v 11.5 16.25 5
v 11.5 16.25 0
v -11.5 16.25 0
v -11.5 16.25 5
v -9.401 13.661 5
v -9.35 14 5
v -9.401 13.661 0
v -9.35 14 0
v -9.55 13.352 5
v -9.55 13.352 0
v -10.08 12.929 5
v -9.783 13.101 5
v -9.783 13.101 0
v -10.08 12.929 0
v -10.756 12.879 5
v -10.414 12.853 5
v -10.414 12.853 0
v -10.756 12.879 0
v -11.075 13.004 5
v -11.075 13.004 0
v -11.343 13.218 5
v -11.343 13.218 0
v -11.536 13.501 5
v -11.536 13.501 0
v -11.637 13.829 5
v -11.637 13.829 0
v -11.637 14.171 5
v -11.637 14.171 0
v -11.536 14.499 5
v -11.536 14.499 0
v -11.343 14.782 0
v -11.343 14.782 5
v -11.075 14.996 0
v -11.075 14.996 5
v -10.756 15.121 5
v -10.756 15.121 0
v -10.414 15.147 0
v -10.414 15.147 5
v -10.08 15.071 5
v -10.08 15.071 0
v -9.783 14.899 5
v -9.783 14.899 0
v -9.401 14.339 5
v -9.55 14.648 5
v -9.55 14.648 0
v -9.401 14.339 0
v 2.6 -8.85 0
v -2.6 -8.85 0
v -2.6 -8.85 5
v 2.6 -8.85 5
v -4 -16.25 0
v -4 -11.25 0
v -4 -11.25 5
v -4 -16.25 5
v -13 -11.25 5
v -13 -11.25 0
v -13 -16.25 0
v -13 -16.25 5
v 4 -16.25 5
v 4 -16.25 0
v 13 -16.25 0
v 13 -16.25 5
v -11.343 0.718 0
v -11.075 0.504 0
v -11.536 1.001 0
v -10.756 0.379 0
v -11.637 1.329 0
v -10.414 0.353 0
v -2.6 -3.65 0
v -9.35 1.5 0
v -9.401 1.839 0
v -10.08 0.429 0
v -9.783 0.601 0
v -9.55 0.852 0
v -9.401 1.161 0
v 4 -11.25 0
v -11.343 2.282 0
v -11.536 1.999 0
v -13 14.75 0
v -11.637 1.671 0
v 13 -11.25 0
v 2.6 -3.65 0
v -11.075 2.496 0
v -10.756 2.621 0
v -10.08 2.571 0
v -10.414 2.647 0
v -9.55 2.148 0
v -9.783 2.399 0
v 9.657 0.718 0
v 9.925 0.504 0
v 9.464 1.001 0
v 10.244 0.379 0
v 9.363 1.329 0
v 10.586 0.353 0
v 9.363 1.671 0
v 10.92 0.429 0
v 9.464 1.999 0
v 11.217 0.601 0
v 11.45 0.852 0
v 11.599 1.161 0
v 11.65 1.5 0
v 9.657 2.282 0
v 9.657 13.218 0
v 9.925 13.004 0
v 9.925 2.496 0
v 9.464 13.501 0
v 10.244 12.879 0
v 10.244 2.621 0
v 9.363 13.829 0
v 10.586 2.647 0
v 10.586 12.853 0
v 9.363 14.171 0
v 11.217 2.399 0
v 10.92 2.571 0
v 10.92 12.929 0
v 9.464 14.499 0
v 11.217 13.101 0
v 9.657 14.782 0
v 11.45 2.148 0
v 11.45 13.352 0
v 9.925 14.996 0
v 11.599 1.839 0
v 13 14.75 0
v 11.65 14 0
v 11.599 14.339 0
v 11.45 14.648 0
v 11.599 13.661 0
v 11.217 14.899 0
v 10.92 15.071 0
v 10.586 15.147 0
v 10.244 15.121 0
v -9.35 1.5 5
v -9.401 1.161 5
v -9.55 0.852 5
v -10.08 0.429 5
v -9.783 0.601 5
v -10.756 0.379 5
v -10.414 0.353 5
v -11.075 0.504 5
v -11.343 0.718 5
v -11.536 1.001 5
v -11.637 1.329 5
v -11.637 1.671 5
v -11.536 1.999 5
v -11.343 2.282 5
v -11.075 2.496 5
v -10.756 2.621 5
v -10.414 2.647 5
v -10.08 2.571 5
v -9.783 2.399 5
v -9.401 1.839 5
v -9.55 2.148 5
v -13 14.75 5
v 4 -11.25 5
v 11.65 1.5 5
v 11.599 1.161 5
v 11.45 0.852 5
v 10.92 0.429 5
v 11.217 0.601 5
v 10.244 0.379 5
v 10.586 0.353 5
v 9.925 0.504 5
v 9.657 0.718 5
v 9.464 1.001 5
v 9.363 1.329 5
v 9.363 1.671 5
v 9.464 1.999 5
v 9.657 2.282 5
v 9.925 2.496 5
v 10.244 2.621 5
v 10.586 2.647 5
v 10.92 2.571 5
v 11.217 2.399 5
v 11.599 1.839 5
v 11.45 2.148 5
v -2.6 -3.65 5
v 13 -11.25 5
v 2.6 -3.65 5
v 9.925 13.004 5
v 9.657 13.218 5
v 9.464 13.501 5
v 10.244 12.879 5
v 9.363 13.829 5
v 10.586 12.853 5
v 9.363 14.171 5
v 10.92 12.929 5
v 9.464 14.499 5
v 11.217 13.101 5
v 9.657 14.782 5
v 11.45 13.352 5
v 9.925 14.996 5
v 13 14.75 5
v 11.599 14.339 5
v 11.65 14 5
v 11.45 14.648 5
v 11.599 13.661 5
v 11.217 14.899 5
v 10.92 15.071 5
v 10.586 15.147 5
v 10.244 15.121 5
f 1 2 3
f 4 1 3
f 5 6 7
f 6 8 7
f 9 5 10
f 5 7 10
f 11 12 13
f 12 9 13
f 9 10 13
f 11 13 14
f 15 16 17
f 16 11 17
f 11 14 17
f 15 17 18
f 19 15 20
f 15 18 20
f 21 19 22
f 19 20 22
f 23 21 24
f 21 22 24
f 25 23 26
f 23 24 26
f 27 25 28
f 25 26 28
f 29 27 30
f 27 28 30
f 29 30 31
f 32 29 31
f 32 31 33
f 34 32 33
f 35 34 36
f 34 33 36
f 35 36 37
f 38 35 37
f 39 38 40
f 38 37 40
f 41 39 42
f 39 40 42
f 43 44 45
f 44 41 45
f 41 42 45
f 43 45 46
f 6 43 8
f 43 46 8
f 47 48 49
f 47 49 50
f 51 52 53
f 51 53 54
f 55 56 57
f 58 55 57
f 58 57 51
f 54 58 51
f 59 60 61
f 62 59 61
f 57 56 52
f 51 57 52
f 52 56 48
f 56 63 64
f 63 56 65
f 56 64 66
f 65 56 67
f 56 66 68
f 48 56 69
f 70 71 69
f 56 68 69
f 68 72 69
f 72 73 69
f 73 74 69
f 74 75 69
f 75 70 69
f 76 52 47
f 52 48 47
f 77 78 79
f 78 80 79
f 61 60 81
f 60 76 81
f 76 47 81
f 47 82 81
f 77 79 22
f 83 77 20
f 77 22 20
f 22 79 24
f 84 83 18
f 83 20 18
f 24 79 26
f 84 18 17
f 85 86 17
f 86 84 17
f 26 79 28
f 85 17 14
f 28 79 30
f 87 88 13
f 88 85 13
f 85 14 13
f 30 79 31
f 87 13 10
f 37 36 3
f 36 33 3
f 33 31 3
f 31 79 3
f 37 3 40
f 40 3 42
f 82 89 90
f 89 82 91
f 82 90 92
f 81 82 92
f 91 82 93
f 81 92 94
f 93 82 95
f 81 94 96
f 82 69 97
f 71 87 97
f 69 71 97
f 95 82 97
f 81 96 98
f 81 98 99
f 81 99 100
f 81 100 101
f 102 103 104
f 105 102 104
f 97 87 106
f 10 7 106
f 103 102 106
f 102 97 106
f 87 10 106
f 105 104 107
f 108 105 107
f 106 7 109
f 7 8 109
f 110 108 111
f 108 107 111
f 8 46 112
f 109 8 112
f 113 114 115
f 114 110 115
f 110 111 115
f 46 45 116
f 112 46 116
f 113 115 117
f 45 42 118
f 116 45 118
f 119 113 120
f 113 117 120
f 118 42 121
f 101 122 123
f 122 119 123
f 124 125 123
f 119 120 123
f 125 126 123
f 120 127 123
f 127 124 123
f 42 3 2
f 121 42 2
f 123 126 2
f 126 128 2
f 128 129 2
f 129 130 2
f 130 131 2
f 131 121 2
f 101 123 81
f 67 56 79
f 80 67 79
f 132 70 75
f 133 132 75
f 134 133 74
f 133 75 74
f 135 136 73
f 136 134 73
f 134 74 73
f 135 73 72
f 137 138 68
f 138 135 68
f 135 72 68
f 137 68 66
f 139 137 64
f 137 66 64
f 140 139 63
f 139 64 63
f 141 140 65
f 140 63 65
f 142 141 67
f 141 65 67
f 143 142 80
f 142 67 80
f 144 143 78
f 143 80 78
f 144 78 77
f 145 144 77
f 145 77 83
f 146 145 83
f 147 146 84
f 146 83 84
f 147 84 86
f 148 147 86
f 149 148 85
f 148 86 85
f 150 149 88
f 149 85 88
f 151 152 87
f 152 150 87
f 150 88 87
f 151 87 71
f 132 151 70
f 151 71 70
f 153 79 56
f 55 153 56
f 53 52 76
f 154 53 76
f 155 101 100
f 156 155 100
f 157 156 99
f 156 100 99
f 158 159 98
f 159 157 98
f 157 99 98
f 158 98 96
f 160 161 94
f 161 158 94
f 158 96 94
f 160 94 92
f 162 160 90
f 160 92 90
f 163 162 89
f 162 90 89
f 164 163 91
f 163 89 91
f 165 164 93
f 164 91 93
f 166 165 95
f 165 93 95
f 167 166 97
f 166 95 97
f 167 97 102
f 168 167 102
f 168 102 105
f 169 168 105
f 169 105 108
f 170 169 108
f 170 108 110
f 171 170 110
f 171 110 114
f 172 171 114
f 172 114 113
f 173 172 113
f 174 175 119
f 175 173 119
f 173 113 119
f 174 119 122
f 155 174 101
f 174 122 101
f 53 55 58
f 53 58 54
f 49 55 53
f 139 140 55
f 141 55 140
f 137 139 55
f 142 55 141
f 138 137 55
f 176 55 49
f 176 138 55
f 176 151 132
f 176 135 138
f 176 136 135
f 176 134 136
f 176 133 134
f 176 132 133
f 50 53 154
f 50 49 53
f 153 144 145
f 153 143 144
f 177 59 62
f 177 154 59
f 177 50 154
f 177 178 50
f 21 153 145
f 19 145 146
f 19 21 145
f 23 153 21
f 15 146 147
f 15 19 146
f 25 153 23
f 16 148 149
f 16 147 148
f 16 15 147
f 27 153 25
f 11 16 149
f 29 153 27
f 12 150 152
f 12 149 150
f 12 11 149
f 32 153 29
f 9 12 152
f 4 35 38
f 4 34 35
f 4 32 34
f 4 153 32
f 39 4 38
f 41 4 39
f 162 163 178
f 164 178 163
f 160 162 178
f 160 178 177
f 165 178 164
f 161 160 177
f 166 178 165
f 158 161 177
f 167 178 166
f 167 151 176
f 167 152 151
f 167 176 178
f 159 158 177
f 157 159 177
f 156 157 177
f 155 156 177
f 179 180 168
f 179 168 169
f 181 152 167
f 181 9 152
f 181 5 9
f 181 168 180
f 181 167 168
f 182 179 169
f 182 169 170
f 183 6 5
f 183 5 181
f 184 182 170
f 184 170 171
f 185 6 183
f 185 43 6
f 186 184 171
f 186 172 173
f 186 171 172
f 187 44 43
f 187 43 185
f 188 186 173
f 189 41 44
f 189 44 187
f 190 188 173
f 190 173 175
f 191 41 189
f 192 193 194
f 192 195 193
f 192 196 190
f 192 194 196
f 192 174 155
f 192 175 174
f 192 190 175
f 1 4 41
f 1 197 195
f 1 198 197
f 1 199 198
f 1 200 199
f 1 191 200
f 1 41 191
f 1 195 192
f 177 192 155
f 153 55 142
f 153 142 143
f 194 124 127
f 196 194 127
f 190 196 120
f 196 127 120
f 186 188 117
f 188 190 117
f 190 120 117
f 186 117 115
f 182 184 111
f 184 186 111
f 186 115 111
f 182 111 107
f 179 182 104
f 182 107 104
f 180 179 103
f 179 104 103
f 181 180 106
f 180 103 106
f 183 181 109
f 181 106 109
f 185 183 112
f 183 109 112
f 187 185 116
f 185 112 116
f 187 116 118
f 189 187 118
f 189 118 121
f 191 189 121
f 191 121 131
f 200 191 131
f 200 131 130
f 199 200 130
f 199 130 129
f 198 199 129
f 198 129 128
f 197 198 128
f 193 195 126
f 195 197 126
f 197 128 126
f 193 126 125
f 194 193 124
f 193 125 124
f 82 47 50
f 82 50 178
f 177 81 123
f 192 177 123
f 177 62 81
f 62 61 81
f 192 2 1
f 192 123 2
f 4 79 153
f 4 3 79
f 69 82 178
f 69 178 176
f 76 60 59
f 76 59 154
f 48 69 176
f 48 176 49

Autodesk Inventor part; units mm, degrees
ref_plane "YZ Plane" through (0, 0, 0) normal (1, 0, 0) x (0, 1, 0)
ref_plane "XZ Plane" through (0, 0, 0) normal (0, 1, 0) x (-1, 0, 0)
ref_plane "XY Plane" through (0, 0, 0) normal (0, 0, 1) x (1, 0, 0)
sketch "Sketch1" plane through (0, 0, 0) normal (0, 0, 1) x (1, 0, 0)
  line L0 (-13, -16.25) -> (13, -16.25)
  line L1 (13, -16.25) -> (13, 16.25)
  line L2 (13, 16.25) -> (-13, 16.25)
  line L3 (-13, 16.25) -> (-13, -16.25)
  line L4 (-13, -16.25) -> (13, 16.25) construction
  line L5 (13, -16.25) -> (-13, 16.25) construction
  line L6 (-10.5, 1.5) -> (10.5, 1.5) construction
  line L7 (10.5, 1.5) -> (10.5, 14) construction
  line L8 (10.5, 14) -> (-10.5, 14) construction
  line L9 (-10.5, 14) -> (-10.5, 1.5) construction
  line L10 (-10.5, 1.5) -> (10.5, 14) construction
  line L11 (10.5, 1.5) -> (-10.5, 14) construction
  circle A0 centre (-10.5, 14) radius 1.15
  circle A1 centre (10.5, 14) radius 1.15
  circle A2 centre (10.5, 1.5) radius 1.15
  circle A3 centre (-10.5, 1.5) radius 1.15
  line L12 (-13, -11.25) -> (-4, -11.25) construction
  line L13 (-4, -11.25) -> (-4, -16.25)
  line L14 (-4, -16.25) -> (-13, -16.25)
  line L15 (-13, -16.25) -> (-13, -11.25)
  line L16 (-13, -11.25) -> (-4, -16.25) construction
  line L17 (-4, -11.25) -> (-13, -16.25) construction
  line L18 (4, -11.25) -> (13, -11.25) construction
  line L19 (13, -11.25) -> (13, -16.25)
  line L20 (13, -16.25) -> (4, -16.25)
  line L21 (4, -16.25) -> (4, -11.25)
  line L22 (4, -11.25) -> (13, -16.25) construction
  line L23 (13, -11.25) -> (4, -16.25) construction
  line L24 (-4, -11.25) -> (4, -11.25)
  line L25 (-2.6, -8.85) -> (2.6, -8.85)
  line L26 (2.6, -8.85) -> (2.6, -3.65)
  line L27 (2.6, -3.65) -> (-2.6, -3.65)
  line L28 (-2.6, -3.65) -> (-2.6, -8.85)
  line L29 (-2.6, -8.85) -> (2.6, -3.65) construction
  line L30 (2.6, -8.85) -> (-2.6, -3.65) construction
  point P0 (0, 0)
  point P1 (0, 7.75)
  point P2 (0, 7.75)
  point P3 (-8.5, -13.75)
  point P4 (8.5, -13.75)
  point P5 (0, -11.25)
  point P6 (0, -16.25)
  point P7 (4, -16.25)
  point P8 (0, -6.25)
  dimension "d0" = 12.5
  dimension "d1" = 21
  dimension "d2" = 2.3
  dimension "d3" = 2.3
  dimension "d4" = 2.3
  dimension "d5" = 2.3
  dimension "d6" = 26
  dimension "d7" = 32.5
  dimension "d9" = 5
  dimension "d10" = 9
  dimension "d11" = 5
  dimension "d12" = 9
  dimension "d17" = 5.2
  dimension "d18" = 5.2
  dimension "d19" = 10
  dimension "d20" = 8.5
extrude "Extrusion1" add sketch "Sketch1" along normal blind 5 contours L3 L2 L1 L0 L21 L24 L13
chamfer "Chamfer1" distance 1.5 angle 45 2 edges at (13, 16.25, 2.5) (-13, 16.25, 2.5)
equation "\"d2\" = d3"
equation "\"d4\" = d2"
equation "\"d5\" = d4"
equation "\"d11\" = d9"
equation "\"d12\" = d10"
properties part number "camera-bracket"
